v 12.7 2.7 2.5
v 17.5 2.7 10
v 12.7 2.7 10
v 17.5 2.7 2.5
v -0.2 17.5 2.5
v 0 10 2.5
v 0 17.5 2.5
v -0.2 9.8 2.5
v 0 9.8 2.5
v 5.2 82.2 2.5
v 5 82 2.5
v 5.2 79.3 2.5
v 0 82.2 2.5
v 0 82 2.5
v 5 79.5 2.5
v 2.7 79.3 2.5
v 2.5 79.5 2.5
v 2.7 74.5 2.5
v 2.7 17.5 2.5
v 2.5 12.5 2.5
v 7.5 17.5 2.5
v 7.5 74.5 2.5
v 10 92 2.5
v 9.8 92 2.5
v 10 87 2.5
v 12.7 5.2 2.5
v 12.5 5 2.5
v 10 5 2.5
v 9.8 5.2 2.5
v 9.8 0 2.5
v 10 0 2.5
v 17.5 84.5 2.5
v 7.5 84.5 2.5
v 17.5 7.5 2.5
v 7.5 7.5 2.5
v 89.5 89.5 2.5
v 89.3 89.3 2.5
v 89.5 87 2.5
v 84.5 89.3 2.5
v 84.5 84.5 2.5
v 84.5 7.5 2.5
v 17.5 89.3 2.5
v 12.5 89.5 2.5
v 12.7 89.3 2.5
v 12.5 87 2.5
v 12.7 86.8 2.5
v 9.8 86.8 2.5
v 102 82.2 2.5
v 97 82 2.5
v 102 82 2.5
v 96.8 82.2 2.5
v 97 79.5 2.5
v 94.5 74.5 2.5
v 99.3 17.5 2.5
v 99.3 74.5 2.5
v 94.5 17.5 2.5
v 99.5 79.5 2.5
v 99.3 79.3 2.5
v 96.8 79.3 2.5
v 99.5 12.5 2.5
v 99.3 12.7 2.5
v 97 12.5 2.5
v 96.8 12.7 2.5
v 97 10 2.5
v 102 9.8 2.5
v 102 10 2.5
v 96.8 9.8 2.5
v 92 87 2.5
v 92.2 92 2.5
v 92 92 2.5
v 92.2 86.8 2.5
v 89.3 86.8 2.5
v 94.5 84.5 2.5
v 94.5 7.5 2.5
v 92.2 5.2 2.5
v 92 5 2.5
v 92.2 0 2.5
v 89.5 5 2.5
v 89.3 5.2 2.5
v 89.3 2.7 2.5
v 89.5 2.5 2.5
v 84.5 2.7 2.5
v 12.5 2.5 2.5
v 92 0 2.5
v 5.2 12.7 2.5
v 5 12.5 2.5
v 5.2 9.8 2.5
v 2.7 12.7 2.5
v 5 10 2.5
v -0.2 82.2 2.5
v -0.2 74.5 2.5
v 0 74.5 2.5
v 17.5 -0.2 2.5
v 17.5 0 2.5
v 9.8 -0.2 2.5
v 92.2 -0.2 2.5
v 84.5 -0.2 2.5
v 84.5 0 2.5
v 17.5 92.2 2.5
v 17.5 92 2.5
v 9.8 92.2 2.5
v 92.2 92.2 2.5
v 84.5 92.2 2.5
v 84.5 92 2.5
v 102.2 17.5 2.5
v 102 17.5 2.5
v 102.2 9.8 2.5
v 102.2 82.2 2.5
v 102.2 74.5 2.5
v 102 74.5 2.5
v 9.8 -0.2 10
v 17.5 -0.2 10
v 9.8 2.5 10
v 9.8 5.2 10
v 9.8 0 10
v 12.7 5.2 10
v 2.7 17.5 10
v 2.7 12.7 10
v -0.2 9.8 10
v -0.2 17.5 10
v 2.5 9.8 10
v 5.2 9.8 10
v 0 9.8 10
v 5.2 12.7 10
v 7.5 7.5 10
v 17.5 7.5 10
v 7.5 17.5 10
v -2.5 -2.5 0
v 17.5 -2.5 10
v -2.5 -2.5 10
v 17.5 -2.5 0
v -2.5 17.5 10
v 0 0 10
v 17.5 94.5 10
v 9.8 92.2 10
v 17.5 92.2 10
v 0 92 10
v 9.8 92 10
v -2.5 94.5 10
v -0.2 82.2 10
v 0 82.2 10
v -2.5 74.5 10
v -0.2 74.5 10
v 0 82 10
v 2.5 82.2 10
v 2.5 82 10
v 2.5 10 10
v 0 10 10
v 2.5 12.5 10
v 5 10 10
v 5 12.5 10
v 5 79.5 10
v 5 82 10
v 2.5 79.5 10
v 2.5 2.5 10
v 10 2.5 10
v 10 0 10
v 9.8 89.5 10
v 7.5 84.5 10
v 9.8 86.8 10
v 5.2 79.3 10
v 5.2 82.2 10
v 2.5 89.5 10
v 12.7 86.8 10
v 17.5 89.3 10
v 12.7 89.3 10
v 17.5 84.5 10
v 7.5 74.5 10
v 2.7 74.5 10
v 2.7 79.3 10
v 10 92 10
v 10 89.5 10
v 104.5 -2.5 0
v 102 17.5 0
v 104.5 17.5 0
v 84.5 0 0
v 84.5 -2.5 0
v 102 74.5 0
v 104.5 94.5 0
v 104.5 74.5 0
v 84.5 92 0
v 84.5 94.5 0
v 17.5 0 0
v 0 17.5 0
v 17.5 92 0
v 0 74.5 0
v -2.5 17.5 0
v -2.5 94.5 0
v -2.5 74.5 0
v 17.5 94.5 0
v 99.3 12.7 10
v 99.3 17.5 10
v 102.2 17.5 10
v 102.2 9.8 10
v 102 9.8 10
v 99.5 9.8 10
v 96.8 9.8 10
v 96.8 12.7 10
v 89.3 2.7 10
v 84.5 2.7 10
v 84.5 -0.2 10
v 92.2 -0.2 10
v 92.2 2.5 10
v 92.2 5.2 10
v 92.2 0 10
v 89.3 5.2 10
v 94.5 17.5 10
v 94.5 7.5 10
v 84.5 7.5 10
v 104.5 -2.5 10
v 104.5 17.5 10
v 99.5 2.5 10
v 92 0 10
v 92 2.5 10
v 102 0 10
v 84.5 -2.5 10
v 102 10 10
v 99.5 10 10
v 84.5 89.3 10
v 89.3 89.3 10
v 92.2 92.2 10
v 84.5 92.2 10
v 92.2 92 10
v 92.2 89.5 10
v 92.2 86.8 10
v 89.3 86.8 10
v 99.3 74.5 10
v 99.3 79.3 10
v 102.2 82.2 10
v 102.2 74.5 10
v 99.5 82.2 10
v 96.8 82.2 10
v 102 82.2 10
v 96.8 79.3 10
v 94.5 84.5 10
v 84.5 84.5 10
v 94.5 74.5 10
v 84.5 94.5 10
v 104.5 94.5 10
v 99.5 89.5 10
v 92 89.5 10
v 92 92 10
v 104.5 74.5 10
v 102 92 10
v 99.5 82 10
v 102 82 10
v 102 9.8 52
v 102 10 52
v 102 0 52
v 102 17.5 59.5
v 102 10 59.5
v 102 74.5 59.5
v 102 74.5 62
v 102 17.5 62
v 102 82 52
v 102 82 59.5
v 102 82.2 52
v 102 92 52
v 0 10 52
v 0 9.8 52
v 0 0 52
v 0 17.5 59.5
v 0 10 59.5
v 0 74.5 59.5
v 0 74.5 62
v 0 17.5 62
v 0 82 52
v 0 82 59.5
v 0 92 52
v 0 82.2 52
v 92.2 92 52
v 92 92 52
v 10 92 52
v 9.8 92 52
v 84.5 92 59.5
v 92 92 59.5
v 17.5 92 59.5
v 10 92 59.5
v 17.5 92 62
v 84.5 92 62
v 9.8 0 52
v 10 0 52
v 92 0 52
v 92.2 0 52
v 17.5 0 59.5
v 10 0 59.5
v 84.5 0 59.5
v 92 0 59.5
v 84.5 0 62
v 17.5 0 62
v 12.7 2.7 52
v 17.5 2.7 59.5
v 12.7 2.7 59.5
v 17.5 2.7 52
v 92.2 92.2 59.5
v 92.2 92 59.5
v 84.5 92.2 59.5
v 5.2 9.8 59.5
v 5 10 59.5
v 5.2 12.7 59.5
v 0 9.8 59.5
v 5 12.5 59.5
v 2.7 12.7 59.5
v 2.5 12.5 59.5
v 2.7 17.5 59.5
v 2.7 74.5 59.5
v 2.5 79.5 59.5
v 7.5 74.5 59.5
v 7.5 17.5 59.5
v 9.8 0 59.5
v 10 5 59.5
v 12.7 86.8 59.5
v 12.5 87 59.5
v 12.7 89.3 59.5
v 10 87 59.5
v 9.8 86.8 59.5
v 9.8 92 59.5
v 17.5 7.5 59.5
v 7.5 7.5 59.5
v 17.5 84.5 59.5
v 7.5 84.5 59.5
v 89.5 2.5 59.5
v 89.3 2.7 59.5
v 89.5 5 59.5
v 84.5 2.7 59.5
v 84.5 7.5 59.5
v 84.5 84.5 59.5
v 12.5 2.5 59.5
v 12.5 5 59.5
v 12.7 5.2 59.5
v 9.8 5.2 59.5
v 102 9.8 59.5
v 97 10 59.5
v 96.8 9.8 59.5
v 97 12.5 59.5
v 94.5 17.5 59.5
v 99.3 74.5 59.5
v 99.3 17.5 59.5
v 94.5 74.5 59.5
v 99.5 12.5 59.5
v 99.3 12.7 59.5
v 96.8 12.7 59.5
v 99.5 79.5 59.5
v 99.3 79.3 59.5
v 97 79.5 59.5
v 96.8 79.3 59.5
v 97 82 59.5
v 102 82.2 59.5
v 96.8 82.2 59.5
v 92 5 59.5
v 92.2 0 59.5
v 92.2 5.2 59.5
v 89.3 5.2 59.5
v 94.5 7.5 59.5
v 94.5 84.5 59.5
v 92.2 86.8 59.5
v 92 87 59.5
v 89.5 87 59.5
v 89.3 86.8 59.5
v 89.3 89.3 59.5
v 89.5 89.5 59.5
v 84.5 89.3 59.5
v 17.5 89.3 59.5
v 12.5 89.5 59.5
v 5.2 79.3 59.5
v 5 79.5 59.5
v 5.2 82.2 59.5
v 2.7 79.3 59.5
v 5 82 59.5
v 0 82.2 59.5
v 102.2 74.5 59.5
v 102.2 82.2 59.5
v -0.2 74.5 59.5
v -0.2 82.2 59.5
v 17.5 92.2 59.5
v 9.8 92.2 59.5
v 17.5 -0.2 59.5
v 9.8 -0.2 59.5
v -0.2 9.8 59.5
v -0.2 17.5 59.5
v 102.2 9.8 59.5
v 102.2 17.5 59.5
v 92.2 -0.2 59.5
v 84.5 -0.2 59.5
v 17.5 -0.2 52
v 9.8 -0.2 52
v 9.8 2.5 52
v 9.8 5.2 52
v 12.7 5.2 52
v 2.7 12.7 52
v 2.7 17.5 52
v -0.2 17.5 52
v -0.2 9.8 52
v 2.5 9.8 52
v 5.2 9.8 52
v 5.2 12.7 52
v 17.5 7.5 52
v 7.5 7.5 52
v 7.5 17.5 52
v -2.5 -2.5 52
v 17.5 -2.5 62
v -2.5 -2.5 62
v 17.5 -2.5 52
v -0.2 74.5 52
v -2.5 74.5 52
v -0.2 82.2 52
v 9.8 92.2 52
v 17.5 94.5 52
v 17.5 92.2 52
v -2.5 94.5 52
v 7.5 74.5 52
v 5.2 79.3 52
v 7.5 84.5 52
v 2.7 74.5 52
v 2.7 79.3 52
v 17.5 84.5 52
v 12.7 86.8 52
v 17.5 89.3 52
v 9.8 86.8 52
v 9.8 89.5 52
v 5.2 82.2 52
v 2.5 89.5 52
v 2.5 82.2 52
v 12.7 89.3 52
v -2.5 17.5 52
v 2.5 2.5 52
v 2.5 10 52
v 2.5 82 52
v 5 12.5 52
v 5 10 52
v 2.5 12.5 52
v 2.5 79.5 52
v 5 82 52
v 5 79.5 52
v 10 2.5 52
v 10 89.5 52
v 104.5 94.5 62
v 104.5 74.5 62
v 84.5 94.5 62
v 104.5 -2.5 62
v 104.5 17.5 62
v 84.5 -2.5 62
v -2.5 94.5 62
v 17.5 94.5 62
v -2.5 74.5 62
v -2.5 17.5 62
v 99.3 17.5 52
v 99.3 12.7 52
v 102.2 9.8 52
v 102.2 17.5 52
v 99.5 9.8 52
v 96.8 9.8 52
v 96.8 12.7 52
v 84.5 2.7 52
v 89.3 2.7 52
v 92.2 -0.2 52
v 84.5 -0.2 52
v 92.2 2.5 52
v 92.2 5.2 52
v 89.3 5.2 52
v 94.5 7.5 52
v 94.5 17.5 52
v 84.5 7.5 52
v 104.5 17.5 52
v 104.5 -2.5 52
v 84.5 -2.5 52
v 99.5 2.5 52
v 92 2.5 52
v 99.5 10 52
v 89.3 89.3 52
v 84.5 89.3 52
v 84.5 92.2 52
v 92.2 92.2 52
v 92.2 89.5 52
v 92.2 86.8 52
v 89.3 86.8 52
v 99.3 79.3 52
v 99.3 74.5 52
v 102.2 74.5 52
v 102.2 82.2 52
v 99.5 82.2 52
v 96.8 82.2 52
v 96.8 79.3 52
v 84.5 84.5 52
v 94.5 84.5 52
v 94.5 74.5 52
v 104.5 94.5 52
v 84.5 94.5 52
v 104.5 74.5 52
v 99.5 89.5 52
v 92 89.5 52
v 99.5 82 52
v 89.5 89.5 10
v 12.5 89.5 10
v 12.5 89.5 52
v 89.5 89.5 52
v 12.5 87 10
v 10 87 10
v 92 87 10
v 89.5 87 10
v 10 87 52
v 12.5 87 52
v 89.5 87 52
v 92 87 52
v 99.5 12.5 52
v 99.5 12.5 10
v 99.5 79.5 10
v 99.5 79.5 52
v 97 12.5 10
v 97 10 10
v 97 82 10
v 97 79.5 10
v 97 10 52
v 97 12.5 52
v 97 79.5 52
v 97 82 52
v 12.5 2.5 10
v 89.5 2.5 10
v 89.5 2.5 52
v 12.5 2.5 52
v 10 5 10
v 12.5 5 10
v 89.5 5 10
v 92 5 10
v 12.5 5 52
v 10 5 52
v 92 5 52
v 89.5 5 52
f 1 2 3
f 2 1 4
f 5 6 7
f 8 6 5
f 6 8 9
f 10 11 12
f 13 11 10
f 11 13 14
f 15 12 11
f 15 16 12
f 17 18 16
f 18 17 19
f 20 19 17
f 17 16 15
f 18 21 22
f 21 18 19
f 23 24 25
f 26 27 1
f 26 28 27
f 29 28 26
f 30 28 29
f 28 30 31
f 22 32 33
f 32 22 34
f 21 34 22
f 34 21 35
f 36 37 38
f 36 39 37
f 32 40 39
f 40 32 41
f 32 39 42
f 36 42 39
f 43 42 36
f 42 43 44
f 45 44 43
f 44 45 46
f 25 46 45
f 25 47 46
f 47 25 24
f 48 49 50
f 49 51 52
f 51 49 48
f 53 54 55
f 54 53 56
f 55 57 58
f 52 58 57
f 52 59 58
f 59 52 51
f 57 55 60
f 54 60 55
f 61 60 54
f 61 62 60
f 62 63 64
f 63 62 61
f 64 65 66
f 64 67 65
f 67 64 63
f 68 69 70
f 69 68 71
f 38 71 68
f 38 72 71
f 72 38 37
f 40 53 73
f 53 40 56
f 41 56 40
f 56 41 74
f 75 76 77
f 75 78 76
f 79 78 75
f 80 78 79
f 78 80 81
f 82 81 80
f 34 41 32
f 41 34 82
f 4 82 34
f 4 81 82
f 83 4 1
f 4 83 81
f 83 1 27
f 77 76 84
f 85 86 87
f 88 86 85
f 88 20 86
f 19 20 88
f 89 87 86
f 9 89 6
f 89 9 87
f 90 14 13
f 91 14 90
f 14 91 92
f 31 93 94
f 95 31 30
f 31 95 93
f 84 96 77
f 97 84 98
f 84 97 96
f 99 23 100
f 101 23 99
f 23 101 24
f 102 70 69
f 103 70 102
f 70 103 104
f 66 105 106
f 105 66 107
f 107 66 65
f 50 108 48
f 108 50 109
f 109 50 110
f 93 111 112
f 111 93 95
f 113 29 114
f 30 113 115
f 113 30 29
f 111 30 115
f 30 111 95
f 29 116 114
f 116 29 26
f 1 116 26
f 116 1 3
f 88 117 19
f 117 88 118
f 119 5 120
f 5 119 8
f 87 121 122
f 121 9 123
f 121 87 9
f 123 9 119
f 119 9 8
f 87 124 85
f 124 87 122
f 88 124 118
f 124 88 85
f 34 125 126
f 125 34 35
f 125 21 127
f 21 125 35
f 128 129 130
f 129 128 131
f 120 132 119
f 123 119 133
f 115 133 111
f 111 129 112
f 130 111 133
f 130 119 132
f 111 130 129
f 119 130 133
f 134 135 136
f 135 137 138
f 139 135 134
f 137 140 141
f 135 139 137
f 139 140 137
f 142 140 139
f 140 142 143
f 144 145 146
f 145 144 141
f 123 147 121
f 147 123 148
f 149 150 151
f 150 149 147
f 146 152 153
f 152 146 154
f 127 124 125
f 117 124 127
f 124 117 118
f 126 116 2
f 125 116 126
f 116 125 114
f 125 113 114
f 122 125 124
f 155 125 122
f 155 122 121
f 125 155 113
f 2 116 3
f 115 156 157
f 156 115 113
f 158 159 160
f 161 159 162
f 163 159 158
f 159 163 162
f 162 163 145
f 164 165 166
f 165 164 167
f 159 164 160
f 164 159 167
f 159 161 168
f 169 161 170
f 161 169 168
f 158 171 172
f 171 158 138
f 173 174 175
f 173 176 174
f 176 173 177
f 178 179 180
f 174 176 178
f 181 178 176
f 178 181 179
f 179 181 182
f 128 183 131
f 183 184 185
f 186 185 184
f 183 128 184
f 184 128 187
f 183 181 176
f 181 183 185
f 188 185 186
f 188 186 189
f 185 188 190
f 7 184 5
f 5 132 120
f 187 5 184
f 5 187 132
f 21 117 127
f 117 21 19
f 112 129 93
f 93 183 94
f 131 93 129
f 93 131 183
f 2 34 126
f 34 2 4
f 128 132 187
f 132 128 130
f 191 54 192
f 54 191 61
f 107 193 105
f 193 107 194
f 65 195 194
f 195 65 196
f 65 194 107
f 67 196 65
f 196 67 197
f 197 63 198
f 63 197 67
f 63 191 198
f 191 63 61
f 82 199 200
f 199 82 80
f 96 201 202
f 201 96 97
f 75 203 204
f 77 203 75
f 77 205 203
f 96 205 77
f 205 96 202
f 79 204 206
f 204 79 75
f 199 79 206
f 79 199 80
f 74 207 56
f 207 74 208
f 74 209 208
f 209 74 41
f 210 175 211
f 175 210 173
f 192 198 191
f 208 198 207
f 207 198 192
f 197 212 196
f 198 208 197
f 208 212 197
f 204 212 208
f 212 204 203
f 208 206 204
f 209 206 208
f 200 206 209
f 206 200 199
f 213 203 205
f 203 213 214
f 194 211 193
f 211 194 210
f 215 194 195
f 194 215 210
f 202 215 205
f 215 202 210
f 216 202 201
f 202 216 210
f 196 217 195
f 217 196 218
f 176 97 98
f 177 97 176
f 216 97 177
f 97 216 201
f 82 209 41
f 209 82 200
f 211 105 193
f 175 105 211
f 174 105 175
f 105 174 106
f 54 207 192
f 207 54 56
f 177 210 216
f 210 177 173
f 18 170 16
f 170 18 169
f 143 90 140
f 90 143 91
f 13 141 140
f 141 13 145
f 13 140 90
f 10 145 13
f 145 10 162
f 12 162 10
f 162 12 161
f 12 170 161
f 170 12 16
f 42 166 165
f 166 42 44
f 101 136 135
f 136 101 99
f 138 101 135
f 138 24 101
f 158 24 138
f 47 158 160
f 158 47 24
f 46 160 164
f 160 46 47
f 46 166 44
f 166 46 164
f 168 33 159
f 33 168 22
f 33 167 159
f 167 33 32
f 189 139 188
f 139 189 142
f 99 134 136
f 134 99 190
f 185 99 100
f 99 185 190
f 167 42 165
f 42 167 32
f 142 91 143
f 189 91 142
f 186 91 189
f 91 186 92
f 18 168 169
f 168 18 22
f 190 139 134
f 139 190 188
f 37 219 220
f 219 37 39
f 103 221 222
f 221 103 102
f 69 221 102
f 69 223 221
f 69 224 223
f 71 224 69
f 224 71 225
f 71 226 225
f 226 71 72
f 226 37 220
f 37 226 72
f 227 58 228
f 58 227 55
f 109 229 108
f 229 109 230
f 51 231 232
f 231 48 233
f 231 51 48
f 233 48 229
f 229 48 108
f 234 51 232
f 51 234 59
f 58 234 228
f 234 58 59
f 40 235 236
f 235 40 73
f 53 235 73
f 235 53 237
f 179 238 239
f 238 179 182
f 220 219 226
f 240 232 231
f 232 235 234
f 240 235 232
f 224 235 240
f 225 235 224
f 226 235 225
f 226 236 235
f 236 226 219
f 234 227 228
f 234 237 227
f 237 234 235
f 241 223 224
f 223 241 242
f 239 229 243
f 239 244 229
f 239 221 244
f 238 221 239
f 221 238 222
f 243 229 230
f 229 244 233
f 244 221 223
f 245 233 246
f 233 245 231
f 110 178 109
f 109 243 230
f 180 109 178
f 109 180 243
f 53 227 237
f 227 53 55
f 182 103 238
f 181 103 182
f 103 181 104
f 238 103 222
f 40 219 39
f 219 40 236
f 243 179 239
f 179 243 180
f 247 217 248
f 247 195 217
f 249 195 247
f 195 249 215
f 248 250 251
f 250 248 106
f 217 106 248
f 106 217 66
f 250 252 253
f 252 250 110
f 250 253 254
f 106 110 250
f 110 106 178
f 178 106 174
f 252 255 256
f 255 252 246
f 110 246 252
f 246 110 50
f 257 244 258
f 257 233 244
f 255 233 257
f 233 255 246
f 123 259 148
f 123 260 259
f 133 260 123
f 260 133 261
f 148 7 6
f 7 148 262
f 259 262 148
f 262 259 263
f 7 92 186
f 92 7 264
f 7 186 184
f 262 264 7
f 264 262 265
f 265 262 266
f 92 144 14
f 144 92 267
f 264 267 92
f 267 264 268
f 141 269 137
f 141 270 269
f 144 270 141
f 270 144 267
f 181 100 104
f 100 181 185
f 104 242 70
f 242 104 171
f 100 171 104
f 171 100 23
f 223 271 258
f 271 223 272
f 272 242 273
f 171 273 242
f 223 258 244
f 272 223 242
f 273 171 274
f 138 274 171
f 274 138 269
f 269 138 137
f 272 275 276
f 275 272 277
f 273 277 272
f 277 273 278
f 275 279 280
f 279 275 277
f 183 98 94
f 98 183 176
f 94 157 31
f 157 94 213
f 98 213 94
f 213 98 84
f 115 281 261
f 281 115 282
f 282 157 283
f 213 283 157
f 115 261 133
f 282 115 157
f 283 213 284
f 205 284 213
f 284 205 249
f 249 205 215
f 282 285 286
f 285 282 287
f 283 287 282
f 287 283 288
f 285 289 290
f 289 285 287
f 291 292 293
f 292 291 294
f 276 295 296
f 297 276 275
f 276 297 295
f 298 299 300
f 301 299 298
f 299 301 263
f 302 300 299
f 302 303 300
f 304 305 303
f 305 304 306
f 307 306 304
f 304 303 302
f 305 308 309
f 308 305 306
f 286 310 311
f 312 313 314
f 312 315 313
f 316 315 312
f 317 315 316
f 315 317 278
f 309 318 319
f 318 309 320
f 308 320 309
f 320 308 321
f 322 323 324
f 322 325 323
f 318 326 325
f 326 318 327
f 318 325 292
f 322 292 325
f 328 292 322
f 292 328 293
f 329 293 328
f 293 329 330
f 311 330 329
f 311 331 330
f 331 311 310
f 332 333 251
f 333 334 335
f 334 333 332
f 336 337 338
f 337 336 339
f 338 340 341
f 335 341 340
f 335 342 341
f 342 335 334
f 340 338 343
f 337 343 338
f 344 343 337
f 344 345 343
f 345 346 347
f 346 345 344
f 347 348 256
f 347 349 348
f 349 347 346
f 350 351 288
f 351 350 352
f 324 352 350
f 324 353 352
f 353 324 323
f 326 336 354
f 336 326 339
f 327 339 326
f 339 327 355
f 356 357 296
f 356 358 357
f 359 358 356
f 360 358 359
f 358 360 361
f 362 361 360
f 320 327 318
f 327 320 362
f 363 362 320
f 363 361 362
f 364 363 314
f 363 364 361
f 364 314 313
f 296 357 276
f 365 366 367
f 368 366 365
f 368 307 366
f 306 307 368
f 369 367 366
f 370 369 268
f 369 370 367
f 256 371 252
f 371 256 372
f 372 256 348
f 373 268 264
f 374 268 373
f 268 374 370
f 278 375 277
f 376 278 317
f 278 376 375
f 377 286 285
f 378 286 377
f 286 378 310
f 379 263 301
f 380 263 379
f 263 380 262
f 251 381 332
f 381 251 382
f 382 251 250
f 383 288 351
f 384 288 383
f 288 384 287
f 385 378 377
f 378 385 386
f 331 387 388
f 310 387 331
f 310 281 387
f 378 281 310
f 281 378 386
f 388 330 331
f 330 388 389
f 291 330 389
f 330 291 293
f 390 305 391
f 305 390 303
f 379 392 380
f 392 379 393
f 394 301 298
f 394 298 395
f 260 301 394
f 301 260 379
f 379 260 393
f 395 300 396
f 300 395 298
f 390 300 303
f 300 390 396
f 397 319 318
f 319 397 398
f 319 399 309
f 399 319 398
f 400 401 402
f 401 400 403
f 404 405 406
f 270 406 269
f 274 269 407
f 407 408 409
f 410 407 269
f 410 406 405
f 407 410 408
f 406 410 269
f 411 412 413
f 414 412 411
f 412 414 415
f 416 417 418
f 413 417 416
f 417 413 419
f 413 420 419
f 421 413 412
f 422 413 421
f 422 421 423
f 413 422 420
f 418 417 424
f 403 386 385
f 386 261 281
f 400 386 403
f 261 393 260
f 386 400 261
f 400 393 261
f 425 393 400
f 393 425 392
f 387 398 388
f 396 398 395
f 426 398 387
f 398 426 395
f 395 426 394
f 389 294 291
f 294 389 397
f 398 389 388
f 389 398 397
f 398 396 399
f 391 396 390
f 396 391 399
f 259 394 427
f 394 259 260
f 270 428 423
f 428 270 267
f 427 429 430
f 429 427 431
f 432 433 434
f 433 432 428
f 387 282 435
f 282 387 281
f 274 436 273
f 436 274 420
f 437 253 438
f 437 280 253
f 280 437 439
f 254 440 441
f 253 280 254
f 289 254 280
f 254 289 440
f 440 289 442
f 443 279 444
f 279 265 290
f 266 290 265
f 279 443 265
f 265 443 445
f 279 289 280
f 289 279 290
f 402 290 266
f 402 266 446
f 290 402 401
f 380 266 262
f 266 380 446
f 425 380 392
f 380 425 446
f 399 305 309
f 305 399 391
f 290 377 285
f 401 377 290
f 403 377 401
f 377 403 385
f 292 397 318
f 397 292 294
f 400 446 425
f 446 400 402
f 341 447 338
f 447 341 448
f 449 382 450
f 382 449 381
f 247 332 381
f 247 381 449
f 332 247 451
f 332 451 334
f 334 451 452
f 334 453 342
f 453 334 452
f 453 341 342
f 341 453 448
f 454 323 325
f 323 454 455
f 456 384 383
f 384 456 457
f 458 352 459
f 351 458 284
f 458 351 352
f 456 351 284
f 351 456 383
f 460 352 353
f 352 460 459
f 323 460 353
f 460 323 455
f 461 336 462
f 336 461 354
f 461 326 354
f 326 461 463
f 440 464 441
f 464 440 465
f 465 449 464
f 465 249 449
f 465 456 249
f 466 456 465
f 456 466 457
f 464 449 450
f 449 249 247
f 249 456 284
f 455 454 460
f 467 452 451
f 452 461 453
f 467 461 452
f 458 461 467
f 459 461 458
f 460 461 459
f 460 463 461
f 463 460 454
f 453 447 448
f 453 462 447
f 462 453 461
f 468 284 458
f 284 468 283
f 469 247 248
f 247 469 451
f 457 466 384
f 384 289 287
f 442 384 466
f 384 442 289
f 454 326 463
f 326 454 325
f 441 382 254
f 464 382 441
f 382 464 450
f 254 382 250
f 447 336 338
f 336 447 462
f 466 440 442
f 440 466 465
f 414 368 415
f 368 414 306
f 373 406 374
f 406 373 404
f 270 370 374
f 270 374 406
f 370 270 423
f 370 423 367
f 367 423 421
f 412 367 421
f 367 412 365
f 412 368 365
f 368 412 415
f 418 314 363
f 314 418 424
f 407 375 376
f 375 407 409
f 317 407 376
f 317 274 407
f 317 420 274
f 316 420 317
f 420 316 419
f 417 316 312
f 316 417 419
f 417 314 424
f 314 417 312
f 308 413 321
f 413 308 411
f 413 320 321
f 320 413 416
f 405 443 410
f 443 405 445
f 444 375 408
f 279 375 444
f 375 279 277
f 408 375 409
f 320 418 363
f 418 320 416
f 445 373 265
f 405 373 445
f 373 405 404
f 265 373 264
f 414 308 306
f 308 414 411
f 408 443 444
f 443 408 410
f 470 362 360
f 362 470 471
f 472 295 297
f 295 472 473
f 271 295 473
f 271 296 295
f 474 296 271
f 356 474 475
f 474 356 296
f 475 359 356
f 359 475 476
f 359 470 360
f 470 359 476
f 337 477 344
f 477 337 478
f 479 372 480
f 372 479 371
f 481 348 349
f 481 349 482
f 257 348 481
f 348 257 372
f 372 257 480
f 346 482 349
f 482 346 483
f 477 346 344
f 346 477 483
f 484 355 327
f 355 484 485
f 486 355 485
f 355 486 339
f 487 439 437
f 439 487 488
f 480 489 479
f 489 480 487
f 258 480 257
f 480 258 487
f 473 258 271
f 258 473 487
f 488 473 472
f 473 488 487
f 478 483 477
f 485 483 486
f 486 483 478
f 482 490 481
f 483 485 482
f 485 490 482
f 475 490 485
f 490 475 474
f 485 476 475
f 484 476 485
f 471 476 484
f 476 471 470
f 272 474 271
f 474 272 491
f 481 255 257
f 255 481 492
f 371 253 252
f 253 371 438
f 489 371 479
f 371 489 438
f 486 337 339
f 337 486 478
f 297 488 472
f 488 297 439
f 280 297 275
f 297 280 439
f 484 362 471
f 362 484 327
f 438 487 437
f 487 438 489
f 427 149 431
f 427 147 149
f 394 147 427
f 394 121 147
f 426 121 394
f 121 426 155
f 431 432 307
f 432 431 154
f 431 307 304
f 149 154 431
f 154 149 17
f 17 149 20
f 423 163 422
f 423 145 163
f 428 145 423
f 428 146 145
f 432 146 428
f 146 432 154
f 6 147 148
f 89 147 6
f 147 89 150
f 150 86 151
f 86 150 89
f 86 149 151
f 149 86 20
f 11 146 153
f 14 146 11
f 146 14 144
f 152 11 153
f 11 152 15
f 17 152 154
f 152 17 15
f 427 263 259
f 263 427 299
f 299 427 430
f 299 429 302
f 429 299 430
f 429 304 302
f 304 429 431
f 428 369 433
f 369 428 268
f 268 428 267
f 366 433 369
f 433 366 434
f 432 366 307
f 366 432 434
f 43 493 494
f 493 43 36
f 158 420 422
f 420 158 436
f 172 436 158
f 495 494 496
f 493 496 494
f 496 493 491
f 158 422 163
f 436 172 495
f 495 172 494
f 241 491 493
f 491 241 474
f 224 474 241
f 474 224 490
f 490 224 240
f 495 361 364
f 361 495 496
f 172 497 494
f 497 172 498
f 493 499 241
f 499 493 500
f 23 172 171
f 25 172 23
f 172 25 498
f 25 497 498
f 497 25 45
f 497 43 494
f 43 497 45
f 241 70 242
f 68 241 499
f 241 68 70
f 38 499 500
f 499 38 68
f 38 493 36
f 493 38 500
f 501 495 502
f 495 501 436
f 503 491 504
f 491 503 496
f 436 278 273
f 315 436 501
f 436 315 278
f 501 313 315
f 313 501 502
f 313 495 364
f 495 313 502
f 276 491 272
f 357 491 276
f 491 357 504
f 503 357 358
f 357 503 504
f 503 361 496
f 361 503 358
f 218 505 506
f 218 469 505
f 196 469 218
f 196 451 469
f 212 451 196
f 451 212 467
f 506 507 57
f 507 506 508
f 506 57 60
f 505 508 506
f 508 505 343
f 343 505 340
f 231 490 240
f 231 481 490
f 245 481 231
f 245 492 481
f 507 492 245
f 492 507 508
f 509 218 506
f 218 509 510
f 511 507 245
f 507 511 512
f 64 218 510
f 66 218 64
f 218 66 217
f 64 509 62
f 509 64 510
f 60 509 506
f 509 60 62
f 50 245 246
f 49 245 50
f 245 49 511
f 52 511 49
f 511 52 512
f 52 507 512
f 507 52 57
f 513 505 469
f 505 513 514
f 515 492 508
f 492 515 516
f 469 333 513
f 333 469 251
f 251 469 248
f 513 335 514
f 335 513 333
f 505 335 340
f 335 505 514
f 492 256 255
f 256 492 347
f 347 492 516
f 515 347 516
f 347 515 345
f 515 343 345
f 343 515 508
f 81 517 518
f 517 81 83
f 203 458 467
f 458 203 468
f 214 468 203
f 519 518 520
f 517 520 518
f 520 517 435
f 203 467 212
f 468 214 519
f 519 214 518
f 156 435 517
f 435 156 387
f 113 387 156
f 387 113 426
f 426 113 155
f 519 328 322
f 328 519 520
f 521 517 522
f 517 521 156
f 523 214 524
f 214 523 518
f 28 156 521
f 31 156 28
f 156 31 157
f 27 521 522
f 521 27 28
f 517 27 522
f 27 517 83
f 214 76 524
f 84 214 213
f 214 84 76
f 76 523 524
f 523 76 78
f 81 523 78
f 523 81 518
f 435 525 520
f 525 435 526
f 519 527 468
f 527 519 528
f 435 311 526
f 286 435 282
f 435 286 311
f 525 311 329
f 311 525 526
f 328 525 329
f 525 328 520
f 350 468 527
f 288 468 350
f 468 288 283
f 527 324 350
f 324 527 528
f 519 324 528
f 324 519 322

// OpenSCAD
length = 102;
width = 92;
height = 62;

// wall thickness
thickness = 2.5;

// height of the locking part
lockHeight = 10.0;

// tolerance for the interlocking pieces
tolerance = 0.4;

// What part should be visualized / exported
part = "box_"; //"box_"; // [box_:The assembled box,top_:Top side,bottom_:Bottom side,sideX1_:One side on the X axis,sideX2_:Other side on the X axis,sideY1_:One side on the Y axis,sideY2_:Other side on the Y axis]

module dovetail(thick, height, tolerance)
{
	translate([-tolerance/2,-tolerance/2,0])
	{
		cube([thick+tolerance, 3*thick+tolerance, height], center = false );
		cube([2*thick+tolerance, thick+tolerance, height], center = false );
	}
}

module cornerpiece(thick, height, tolerance)
{
	difference()
	{
		translate([0,0,height/2])
		{
			cube(size = [thick * 8, thick * 8, height], center = true);
		}
		union()
		{
			translate([3*thick, thick, thick])
			{
				mirror([1,0,0])
				{
					dovetail(thick, height, tolerance);
				}
			}
			translate([-thick, -3*thick, thick])
			{
				rotate([0,0,90])
				{
					dovetail(thick, height, tolerance);
				}
			}
			translate([-thick*4-1,0,-0.5]) {	cube( size = [thick*4+1, thick*4+1, height+1]); }
		}
	}
}

module baseplane()
{
	cube([length, width, thickness], center = false);
	translate([thickness*3, thickness*3, 0]) { rotate([0,0,-90]){ cornerpiece(thickness, lockHeight, tolerance); }}
	translate([length-thickness*3, thickness*3, 0]) { rotate([0,0,0]){ cornerpiece(thickness, lockHeight, tolerance); }}
	translate([thickness*3, width-thickness*3, 0]) { rotate([0,0,180]){ cornerpiece(thickness, lockHeight, tolerance); }}
	translate([length-thickness*3, width-thickness*3, 0]) { rotate([0,0,90]){ cornerpiece(thickness, lockHeight, tolerance); }}
}

module topplane()
{
	mirror([0,0,1]) { baseplane(); }
}

module sideDovetail(width, height)
{
	translate([0, 4*thickness, 0]) {
		dovetail(thickness, lockHeight-thickness, 0);
		cube([thickness, width-8*thickness, lockHeight-thickness]);
	}
	translate([0, width-4*thickness, 0]) { mirror([0,1,0]) {	dovetail(thickness, lockHeight-thickness, 0); }}
}
module side(width, height, reduceWidth)
{
	translate([0,0,thickness]) { sideDovetail(width, height); }
	translate([0, reduceWidth, lockHeight])
	{
		cube([thickness, width-2*reduceWidth, height - 2*(lockHeight)]);
	}
	translate([0, 0, height - lockHeight]) { sideDovetail(width, height); }
}

if (part == "box_" || part == "bottom_")
{
	baseplane();
}

if (part == "box_" || part == "top_")
{
	translate([0,0,height]) { topplane(); }
}

if (part == "box_" || part == "sideX1_")
{
	color([1,0,0]) {
		side(width, height,0);
	}
}


if (part == "box_" || part == "sideY1_")
{
	color([0,0,1]) {
		translate([0, width, 0])
		{
			rotate([0,0,-90]) {side(length, height, thickness); }
		}
	}
}


if (part == "box_" || part == "sideX2_")
{
	color([1,0,0]) {
		translate([length,0, 0]) { mirror([1,0,0]) { side(width, height,0); }}
	}
}


if (part == "box_" || part == "sideY2_")
{
	color([0,0,1]) {
		mirror([0,1,0]){
			rotate([0,0,-90]) {side(length, height, thickness); }
		}
	}
}
